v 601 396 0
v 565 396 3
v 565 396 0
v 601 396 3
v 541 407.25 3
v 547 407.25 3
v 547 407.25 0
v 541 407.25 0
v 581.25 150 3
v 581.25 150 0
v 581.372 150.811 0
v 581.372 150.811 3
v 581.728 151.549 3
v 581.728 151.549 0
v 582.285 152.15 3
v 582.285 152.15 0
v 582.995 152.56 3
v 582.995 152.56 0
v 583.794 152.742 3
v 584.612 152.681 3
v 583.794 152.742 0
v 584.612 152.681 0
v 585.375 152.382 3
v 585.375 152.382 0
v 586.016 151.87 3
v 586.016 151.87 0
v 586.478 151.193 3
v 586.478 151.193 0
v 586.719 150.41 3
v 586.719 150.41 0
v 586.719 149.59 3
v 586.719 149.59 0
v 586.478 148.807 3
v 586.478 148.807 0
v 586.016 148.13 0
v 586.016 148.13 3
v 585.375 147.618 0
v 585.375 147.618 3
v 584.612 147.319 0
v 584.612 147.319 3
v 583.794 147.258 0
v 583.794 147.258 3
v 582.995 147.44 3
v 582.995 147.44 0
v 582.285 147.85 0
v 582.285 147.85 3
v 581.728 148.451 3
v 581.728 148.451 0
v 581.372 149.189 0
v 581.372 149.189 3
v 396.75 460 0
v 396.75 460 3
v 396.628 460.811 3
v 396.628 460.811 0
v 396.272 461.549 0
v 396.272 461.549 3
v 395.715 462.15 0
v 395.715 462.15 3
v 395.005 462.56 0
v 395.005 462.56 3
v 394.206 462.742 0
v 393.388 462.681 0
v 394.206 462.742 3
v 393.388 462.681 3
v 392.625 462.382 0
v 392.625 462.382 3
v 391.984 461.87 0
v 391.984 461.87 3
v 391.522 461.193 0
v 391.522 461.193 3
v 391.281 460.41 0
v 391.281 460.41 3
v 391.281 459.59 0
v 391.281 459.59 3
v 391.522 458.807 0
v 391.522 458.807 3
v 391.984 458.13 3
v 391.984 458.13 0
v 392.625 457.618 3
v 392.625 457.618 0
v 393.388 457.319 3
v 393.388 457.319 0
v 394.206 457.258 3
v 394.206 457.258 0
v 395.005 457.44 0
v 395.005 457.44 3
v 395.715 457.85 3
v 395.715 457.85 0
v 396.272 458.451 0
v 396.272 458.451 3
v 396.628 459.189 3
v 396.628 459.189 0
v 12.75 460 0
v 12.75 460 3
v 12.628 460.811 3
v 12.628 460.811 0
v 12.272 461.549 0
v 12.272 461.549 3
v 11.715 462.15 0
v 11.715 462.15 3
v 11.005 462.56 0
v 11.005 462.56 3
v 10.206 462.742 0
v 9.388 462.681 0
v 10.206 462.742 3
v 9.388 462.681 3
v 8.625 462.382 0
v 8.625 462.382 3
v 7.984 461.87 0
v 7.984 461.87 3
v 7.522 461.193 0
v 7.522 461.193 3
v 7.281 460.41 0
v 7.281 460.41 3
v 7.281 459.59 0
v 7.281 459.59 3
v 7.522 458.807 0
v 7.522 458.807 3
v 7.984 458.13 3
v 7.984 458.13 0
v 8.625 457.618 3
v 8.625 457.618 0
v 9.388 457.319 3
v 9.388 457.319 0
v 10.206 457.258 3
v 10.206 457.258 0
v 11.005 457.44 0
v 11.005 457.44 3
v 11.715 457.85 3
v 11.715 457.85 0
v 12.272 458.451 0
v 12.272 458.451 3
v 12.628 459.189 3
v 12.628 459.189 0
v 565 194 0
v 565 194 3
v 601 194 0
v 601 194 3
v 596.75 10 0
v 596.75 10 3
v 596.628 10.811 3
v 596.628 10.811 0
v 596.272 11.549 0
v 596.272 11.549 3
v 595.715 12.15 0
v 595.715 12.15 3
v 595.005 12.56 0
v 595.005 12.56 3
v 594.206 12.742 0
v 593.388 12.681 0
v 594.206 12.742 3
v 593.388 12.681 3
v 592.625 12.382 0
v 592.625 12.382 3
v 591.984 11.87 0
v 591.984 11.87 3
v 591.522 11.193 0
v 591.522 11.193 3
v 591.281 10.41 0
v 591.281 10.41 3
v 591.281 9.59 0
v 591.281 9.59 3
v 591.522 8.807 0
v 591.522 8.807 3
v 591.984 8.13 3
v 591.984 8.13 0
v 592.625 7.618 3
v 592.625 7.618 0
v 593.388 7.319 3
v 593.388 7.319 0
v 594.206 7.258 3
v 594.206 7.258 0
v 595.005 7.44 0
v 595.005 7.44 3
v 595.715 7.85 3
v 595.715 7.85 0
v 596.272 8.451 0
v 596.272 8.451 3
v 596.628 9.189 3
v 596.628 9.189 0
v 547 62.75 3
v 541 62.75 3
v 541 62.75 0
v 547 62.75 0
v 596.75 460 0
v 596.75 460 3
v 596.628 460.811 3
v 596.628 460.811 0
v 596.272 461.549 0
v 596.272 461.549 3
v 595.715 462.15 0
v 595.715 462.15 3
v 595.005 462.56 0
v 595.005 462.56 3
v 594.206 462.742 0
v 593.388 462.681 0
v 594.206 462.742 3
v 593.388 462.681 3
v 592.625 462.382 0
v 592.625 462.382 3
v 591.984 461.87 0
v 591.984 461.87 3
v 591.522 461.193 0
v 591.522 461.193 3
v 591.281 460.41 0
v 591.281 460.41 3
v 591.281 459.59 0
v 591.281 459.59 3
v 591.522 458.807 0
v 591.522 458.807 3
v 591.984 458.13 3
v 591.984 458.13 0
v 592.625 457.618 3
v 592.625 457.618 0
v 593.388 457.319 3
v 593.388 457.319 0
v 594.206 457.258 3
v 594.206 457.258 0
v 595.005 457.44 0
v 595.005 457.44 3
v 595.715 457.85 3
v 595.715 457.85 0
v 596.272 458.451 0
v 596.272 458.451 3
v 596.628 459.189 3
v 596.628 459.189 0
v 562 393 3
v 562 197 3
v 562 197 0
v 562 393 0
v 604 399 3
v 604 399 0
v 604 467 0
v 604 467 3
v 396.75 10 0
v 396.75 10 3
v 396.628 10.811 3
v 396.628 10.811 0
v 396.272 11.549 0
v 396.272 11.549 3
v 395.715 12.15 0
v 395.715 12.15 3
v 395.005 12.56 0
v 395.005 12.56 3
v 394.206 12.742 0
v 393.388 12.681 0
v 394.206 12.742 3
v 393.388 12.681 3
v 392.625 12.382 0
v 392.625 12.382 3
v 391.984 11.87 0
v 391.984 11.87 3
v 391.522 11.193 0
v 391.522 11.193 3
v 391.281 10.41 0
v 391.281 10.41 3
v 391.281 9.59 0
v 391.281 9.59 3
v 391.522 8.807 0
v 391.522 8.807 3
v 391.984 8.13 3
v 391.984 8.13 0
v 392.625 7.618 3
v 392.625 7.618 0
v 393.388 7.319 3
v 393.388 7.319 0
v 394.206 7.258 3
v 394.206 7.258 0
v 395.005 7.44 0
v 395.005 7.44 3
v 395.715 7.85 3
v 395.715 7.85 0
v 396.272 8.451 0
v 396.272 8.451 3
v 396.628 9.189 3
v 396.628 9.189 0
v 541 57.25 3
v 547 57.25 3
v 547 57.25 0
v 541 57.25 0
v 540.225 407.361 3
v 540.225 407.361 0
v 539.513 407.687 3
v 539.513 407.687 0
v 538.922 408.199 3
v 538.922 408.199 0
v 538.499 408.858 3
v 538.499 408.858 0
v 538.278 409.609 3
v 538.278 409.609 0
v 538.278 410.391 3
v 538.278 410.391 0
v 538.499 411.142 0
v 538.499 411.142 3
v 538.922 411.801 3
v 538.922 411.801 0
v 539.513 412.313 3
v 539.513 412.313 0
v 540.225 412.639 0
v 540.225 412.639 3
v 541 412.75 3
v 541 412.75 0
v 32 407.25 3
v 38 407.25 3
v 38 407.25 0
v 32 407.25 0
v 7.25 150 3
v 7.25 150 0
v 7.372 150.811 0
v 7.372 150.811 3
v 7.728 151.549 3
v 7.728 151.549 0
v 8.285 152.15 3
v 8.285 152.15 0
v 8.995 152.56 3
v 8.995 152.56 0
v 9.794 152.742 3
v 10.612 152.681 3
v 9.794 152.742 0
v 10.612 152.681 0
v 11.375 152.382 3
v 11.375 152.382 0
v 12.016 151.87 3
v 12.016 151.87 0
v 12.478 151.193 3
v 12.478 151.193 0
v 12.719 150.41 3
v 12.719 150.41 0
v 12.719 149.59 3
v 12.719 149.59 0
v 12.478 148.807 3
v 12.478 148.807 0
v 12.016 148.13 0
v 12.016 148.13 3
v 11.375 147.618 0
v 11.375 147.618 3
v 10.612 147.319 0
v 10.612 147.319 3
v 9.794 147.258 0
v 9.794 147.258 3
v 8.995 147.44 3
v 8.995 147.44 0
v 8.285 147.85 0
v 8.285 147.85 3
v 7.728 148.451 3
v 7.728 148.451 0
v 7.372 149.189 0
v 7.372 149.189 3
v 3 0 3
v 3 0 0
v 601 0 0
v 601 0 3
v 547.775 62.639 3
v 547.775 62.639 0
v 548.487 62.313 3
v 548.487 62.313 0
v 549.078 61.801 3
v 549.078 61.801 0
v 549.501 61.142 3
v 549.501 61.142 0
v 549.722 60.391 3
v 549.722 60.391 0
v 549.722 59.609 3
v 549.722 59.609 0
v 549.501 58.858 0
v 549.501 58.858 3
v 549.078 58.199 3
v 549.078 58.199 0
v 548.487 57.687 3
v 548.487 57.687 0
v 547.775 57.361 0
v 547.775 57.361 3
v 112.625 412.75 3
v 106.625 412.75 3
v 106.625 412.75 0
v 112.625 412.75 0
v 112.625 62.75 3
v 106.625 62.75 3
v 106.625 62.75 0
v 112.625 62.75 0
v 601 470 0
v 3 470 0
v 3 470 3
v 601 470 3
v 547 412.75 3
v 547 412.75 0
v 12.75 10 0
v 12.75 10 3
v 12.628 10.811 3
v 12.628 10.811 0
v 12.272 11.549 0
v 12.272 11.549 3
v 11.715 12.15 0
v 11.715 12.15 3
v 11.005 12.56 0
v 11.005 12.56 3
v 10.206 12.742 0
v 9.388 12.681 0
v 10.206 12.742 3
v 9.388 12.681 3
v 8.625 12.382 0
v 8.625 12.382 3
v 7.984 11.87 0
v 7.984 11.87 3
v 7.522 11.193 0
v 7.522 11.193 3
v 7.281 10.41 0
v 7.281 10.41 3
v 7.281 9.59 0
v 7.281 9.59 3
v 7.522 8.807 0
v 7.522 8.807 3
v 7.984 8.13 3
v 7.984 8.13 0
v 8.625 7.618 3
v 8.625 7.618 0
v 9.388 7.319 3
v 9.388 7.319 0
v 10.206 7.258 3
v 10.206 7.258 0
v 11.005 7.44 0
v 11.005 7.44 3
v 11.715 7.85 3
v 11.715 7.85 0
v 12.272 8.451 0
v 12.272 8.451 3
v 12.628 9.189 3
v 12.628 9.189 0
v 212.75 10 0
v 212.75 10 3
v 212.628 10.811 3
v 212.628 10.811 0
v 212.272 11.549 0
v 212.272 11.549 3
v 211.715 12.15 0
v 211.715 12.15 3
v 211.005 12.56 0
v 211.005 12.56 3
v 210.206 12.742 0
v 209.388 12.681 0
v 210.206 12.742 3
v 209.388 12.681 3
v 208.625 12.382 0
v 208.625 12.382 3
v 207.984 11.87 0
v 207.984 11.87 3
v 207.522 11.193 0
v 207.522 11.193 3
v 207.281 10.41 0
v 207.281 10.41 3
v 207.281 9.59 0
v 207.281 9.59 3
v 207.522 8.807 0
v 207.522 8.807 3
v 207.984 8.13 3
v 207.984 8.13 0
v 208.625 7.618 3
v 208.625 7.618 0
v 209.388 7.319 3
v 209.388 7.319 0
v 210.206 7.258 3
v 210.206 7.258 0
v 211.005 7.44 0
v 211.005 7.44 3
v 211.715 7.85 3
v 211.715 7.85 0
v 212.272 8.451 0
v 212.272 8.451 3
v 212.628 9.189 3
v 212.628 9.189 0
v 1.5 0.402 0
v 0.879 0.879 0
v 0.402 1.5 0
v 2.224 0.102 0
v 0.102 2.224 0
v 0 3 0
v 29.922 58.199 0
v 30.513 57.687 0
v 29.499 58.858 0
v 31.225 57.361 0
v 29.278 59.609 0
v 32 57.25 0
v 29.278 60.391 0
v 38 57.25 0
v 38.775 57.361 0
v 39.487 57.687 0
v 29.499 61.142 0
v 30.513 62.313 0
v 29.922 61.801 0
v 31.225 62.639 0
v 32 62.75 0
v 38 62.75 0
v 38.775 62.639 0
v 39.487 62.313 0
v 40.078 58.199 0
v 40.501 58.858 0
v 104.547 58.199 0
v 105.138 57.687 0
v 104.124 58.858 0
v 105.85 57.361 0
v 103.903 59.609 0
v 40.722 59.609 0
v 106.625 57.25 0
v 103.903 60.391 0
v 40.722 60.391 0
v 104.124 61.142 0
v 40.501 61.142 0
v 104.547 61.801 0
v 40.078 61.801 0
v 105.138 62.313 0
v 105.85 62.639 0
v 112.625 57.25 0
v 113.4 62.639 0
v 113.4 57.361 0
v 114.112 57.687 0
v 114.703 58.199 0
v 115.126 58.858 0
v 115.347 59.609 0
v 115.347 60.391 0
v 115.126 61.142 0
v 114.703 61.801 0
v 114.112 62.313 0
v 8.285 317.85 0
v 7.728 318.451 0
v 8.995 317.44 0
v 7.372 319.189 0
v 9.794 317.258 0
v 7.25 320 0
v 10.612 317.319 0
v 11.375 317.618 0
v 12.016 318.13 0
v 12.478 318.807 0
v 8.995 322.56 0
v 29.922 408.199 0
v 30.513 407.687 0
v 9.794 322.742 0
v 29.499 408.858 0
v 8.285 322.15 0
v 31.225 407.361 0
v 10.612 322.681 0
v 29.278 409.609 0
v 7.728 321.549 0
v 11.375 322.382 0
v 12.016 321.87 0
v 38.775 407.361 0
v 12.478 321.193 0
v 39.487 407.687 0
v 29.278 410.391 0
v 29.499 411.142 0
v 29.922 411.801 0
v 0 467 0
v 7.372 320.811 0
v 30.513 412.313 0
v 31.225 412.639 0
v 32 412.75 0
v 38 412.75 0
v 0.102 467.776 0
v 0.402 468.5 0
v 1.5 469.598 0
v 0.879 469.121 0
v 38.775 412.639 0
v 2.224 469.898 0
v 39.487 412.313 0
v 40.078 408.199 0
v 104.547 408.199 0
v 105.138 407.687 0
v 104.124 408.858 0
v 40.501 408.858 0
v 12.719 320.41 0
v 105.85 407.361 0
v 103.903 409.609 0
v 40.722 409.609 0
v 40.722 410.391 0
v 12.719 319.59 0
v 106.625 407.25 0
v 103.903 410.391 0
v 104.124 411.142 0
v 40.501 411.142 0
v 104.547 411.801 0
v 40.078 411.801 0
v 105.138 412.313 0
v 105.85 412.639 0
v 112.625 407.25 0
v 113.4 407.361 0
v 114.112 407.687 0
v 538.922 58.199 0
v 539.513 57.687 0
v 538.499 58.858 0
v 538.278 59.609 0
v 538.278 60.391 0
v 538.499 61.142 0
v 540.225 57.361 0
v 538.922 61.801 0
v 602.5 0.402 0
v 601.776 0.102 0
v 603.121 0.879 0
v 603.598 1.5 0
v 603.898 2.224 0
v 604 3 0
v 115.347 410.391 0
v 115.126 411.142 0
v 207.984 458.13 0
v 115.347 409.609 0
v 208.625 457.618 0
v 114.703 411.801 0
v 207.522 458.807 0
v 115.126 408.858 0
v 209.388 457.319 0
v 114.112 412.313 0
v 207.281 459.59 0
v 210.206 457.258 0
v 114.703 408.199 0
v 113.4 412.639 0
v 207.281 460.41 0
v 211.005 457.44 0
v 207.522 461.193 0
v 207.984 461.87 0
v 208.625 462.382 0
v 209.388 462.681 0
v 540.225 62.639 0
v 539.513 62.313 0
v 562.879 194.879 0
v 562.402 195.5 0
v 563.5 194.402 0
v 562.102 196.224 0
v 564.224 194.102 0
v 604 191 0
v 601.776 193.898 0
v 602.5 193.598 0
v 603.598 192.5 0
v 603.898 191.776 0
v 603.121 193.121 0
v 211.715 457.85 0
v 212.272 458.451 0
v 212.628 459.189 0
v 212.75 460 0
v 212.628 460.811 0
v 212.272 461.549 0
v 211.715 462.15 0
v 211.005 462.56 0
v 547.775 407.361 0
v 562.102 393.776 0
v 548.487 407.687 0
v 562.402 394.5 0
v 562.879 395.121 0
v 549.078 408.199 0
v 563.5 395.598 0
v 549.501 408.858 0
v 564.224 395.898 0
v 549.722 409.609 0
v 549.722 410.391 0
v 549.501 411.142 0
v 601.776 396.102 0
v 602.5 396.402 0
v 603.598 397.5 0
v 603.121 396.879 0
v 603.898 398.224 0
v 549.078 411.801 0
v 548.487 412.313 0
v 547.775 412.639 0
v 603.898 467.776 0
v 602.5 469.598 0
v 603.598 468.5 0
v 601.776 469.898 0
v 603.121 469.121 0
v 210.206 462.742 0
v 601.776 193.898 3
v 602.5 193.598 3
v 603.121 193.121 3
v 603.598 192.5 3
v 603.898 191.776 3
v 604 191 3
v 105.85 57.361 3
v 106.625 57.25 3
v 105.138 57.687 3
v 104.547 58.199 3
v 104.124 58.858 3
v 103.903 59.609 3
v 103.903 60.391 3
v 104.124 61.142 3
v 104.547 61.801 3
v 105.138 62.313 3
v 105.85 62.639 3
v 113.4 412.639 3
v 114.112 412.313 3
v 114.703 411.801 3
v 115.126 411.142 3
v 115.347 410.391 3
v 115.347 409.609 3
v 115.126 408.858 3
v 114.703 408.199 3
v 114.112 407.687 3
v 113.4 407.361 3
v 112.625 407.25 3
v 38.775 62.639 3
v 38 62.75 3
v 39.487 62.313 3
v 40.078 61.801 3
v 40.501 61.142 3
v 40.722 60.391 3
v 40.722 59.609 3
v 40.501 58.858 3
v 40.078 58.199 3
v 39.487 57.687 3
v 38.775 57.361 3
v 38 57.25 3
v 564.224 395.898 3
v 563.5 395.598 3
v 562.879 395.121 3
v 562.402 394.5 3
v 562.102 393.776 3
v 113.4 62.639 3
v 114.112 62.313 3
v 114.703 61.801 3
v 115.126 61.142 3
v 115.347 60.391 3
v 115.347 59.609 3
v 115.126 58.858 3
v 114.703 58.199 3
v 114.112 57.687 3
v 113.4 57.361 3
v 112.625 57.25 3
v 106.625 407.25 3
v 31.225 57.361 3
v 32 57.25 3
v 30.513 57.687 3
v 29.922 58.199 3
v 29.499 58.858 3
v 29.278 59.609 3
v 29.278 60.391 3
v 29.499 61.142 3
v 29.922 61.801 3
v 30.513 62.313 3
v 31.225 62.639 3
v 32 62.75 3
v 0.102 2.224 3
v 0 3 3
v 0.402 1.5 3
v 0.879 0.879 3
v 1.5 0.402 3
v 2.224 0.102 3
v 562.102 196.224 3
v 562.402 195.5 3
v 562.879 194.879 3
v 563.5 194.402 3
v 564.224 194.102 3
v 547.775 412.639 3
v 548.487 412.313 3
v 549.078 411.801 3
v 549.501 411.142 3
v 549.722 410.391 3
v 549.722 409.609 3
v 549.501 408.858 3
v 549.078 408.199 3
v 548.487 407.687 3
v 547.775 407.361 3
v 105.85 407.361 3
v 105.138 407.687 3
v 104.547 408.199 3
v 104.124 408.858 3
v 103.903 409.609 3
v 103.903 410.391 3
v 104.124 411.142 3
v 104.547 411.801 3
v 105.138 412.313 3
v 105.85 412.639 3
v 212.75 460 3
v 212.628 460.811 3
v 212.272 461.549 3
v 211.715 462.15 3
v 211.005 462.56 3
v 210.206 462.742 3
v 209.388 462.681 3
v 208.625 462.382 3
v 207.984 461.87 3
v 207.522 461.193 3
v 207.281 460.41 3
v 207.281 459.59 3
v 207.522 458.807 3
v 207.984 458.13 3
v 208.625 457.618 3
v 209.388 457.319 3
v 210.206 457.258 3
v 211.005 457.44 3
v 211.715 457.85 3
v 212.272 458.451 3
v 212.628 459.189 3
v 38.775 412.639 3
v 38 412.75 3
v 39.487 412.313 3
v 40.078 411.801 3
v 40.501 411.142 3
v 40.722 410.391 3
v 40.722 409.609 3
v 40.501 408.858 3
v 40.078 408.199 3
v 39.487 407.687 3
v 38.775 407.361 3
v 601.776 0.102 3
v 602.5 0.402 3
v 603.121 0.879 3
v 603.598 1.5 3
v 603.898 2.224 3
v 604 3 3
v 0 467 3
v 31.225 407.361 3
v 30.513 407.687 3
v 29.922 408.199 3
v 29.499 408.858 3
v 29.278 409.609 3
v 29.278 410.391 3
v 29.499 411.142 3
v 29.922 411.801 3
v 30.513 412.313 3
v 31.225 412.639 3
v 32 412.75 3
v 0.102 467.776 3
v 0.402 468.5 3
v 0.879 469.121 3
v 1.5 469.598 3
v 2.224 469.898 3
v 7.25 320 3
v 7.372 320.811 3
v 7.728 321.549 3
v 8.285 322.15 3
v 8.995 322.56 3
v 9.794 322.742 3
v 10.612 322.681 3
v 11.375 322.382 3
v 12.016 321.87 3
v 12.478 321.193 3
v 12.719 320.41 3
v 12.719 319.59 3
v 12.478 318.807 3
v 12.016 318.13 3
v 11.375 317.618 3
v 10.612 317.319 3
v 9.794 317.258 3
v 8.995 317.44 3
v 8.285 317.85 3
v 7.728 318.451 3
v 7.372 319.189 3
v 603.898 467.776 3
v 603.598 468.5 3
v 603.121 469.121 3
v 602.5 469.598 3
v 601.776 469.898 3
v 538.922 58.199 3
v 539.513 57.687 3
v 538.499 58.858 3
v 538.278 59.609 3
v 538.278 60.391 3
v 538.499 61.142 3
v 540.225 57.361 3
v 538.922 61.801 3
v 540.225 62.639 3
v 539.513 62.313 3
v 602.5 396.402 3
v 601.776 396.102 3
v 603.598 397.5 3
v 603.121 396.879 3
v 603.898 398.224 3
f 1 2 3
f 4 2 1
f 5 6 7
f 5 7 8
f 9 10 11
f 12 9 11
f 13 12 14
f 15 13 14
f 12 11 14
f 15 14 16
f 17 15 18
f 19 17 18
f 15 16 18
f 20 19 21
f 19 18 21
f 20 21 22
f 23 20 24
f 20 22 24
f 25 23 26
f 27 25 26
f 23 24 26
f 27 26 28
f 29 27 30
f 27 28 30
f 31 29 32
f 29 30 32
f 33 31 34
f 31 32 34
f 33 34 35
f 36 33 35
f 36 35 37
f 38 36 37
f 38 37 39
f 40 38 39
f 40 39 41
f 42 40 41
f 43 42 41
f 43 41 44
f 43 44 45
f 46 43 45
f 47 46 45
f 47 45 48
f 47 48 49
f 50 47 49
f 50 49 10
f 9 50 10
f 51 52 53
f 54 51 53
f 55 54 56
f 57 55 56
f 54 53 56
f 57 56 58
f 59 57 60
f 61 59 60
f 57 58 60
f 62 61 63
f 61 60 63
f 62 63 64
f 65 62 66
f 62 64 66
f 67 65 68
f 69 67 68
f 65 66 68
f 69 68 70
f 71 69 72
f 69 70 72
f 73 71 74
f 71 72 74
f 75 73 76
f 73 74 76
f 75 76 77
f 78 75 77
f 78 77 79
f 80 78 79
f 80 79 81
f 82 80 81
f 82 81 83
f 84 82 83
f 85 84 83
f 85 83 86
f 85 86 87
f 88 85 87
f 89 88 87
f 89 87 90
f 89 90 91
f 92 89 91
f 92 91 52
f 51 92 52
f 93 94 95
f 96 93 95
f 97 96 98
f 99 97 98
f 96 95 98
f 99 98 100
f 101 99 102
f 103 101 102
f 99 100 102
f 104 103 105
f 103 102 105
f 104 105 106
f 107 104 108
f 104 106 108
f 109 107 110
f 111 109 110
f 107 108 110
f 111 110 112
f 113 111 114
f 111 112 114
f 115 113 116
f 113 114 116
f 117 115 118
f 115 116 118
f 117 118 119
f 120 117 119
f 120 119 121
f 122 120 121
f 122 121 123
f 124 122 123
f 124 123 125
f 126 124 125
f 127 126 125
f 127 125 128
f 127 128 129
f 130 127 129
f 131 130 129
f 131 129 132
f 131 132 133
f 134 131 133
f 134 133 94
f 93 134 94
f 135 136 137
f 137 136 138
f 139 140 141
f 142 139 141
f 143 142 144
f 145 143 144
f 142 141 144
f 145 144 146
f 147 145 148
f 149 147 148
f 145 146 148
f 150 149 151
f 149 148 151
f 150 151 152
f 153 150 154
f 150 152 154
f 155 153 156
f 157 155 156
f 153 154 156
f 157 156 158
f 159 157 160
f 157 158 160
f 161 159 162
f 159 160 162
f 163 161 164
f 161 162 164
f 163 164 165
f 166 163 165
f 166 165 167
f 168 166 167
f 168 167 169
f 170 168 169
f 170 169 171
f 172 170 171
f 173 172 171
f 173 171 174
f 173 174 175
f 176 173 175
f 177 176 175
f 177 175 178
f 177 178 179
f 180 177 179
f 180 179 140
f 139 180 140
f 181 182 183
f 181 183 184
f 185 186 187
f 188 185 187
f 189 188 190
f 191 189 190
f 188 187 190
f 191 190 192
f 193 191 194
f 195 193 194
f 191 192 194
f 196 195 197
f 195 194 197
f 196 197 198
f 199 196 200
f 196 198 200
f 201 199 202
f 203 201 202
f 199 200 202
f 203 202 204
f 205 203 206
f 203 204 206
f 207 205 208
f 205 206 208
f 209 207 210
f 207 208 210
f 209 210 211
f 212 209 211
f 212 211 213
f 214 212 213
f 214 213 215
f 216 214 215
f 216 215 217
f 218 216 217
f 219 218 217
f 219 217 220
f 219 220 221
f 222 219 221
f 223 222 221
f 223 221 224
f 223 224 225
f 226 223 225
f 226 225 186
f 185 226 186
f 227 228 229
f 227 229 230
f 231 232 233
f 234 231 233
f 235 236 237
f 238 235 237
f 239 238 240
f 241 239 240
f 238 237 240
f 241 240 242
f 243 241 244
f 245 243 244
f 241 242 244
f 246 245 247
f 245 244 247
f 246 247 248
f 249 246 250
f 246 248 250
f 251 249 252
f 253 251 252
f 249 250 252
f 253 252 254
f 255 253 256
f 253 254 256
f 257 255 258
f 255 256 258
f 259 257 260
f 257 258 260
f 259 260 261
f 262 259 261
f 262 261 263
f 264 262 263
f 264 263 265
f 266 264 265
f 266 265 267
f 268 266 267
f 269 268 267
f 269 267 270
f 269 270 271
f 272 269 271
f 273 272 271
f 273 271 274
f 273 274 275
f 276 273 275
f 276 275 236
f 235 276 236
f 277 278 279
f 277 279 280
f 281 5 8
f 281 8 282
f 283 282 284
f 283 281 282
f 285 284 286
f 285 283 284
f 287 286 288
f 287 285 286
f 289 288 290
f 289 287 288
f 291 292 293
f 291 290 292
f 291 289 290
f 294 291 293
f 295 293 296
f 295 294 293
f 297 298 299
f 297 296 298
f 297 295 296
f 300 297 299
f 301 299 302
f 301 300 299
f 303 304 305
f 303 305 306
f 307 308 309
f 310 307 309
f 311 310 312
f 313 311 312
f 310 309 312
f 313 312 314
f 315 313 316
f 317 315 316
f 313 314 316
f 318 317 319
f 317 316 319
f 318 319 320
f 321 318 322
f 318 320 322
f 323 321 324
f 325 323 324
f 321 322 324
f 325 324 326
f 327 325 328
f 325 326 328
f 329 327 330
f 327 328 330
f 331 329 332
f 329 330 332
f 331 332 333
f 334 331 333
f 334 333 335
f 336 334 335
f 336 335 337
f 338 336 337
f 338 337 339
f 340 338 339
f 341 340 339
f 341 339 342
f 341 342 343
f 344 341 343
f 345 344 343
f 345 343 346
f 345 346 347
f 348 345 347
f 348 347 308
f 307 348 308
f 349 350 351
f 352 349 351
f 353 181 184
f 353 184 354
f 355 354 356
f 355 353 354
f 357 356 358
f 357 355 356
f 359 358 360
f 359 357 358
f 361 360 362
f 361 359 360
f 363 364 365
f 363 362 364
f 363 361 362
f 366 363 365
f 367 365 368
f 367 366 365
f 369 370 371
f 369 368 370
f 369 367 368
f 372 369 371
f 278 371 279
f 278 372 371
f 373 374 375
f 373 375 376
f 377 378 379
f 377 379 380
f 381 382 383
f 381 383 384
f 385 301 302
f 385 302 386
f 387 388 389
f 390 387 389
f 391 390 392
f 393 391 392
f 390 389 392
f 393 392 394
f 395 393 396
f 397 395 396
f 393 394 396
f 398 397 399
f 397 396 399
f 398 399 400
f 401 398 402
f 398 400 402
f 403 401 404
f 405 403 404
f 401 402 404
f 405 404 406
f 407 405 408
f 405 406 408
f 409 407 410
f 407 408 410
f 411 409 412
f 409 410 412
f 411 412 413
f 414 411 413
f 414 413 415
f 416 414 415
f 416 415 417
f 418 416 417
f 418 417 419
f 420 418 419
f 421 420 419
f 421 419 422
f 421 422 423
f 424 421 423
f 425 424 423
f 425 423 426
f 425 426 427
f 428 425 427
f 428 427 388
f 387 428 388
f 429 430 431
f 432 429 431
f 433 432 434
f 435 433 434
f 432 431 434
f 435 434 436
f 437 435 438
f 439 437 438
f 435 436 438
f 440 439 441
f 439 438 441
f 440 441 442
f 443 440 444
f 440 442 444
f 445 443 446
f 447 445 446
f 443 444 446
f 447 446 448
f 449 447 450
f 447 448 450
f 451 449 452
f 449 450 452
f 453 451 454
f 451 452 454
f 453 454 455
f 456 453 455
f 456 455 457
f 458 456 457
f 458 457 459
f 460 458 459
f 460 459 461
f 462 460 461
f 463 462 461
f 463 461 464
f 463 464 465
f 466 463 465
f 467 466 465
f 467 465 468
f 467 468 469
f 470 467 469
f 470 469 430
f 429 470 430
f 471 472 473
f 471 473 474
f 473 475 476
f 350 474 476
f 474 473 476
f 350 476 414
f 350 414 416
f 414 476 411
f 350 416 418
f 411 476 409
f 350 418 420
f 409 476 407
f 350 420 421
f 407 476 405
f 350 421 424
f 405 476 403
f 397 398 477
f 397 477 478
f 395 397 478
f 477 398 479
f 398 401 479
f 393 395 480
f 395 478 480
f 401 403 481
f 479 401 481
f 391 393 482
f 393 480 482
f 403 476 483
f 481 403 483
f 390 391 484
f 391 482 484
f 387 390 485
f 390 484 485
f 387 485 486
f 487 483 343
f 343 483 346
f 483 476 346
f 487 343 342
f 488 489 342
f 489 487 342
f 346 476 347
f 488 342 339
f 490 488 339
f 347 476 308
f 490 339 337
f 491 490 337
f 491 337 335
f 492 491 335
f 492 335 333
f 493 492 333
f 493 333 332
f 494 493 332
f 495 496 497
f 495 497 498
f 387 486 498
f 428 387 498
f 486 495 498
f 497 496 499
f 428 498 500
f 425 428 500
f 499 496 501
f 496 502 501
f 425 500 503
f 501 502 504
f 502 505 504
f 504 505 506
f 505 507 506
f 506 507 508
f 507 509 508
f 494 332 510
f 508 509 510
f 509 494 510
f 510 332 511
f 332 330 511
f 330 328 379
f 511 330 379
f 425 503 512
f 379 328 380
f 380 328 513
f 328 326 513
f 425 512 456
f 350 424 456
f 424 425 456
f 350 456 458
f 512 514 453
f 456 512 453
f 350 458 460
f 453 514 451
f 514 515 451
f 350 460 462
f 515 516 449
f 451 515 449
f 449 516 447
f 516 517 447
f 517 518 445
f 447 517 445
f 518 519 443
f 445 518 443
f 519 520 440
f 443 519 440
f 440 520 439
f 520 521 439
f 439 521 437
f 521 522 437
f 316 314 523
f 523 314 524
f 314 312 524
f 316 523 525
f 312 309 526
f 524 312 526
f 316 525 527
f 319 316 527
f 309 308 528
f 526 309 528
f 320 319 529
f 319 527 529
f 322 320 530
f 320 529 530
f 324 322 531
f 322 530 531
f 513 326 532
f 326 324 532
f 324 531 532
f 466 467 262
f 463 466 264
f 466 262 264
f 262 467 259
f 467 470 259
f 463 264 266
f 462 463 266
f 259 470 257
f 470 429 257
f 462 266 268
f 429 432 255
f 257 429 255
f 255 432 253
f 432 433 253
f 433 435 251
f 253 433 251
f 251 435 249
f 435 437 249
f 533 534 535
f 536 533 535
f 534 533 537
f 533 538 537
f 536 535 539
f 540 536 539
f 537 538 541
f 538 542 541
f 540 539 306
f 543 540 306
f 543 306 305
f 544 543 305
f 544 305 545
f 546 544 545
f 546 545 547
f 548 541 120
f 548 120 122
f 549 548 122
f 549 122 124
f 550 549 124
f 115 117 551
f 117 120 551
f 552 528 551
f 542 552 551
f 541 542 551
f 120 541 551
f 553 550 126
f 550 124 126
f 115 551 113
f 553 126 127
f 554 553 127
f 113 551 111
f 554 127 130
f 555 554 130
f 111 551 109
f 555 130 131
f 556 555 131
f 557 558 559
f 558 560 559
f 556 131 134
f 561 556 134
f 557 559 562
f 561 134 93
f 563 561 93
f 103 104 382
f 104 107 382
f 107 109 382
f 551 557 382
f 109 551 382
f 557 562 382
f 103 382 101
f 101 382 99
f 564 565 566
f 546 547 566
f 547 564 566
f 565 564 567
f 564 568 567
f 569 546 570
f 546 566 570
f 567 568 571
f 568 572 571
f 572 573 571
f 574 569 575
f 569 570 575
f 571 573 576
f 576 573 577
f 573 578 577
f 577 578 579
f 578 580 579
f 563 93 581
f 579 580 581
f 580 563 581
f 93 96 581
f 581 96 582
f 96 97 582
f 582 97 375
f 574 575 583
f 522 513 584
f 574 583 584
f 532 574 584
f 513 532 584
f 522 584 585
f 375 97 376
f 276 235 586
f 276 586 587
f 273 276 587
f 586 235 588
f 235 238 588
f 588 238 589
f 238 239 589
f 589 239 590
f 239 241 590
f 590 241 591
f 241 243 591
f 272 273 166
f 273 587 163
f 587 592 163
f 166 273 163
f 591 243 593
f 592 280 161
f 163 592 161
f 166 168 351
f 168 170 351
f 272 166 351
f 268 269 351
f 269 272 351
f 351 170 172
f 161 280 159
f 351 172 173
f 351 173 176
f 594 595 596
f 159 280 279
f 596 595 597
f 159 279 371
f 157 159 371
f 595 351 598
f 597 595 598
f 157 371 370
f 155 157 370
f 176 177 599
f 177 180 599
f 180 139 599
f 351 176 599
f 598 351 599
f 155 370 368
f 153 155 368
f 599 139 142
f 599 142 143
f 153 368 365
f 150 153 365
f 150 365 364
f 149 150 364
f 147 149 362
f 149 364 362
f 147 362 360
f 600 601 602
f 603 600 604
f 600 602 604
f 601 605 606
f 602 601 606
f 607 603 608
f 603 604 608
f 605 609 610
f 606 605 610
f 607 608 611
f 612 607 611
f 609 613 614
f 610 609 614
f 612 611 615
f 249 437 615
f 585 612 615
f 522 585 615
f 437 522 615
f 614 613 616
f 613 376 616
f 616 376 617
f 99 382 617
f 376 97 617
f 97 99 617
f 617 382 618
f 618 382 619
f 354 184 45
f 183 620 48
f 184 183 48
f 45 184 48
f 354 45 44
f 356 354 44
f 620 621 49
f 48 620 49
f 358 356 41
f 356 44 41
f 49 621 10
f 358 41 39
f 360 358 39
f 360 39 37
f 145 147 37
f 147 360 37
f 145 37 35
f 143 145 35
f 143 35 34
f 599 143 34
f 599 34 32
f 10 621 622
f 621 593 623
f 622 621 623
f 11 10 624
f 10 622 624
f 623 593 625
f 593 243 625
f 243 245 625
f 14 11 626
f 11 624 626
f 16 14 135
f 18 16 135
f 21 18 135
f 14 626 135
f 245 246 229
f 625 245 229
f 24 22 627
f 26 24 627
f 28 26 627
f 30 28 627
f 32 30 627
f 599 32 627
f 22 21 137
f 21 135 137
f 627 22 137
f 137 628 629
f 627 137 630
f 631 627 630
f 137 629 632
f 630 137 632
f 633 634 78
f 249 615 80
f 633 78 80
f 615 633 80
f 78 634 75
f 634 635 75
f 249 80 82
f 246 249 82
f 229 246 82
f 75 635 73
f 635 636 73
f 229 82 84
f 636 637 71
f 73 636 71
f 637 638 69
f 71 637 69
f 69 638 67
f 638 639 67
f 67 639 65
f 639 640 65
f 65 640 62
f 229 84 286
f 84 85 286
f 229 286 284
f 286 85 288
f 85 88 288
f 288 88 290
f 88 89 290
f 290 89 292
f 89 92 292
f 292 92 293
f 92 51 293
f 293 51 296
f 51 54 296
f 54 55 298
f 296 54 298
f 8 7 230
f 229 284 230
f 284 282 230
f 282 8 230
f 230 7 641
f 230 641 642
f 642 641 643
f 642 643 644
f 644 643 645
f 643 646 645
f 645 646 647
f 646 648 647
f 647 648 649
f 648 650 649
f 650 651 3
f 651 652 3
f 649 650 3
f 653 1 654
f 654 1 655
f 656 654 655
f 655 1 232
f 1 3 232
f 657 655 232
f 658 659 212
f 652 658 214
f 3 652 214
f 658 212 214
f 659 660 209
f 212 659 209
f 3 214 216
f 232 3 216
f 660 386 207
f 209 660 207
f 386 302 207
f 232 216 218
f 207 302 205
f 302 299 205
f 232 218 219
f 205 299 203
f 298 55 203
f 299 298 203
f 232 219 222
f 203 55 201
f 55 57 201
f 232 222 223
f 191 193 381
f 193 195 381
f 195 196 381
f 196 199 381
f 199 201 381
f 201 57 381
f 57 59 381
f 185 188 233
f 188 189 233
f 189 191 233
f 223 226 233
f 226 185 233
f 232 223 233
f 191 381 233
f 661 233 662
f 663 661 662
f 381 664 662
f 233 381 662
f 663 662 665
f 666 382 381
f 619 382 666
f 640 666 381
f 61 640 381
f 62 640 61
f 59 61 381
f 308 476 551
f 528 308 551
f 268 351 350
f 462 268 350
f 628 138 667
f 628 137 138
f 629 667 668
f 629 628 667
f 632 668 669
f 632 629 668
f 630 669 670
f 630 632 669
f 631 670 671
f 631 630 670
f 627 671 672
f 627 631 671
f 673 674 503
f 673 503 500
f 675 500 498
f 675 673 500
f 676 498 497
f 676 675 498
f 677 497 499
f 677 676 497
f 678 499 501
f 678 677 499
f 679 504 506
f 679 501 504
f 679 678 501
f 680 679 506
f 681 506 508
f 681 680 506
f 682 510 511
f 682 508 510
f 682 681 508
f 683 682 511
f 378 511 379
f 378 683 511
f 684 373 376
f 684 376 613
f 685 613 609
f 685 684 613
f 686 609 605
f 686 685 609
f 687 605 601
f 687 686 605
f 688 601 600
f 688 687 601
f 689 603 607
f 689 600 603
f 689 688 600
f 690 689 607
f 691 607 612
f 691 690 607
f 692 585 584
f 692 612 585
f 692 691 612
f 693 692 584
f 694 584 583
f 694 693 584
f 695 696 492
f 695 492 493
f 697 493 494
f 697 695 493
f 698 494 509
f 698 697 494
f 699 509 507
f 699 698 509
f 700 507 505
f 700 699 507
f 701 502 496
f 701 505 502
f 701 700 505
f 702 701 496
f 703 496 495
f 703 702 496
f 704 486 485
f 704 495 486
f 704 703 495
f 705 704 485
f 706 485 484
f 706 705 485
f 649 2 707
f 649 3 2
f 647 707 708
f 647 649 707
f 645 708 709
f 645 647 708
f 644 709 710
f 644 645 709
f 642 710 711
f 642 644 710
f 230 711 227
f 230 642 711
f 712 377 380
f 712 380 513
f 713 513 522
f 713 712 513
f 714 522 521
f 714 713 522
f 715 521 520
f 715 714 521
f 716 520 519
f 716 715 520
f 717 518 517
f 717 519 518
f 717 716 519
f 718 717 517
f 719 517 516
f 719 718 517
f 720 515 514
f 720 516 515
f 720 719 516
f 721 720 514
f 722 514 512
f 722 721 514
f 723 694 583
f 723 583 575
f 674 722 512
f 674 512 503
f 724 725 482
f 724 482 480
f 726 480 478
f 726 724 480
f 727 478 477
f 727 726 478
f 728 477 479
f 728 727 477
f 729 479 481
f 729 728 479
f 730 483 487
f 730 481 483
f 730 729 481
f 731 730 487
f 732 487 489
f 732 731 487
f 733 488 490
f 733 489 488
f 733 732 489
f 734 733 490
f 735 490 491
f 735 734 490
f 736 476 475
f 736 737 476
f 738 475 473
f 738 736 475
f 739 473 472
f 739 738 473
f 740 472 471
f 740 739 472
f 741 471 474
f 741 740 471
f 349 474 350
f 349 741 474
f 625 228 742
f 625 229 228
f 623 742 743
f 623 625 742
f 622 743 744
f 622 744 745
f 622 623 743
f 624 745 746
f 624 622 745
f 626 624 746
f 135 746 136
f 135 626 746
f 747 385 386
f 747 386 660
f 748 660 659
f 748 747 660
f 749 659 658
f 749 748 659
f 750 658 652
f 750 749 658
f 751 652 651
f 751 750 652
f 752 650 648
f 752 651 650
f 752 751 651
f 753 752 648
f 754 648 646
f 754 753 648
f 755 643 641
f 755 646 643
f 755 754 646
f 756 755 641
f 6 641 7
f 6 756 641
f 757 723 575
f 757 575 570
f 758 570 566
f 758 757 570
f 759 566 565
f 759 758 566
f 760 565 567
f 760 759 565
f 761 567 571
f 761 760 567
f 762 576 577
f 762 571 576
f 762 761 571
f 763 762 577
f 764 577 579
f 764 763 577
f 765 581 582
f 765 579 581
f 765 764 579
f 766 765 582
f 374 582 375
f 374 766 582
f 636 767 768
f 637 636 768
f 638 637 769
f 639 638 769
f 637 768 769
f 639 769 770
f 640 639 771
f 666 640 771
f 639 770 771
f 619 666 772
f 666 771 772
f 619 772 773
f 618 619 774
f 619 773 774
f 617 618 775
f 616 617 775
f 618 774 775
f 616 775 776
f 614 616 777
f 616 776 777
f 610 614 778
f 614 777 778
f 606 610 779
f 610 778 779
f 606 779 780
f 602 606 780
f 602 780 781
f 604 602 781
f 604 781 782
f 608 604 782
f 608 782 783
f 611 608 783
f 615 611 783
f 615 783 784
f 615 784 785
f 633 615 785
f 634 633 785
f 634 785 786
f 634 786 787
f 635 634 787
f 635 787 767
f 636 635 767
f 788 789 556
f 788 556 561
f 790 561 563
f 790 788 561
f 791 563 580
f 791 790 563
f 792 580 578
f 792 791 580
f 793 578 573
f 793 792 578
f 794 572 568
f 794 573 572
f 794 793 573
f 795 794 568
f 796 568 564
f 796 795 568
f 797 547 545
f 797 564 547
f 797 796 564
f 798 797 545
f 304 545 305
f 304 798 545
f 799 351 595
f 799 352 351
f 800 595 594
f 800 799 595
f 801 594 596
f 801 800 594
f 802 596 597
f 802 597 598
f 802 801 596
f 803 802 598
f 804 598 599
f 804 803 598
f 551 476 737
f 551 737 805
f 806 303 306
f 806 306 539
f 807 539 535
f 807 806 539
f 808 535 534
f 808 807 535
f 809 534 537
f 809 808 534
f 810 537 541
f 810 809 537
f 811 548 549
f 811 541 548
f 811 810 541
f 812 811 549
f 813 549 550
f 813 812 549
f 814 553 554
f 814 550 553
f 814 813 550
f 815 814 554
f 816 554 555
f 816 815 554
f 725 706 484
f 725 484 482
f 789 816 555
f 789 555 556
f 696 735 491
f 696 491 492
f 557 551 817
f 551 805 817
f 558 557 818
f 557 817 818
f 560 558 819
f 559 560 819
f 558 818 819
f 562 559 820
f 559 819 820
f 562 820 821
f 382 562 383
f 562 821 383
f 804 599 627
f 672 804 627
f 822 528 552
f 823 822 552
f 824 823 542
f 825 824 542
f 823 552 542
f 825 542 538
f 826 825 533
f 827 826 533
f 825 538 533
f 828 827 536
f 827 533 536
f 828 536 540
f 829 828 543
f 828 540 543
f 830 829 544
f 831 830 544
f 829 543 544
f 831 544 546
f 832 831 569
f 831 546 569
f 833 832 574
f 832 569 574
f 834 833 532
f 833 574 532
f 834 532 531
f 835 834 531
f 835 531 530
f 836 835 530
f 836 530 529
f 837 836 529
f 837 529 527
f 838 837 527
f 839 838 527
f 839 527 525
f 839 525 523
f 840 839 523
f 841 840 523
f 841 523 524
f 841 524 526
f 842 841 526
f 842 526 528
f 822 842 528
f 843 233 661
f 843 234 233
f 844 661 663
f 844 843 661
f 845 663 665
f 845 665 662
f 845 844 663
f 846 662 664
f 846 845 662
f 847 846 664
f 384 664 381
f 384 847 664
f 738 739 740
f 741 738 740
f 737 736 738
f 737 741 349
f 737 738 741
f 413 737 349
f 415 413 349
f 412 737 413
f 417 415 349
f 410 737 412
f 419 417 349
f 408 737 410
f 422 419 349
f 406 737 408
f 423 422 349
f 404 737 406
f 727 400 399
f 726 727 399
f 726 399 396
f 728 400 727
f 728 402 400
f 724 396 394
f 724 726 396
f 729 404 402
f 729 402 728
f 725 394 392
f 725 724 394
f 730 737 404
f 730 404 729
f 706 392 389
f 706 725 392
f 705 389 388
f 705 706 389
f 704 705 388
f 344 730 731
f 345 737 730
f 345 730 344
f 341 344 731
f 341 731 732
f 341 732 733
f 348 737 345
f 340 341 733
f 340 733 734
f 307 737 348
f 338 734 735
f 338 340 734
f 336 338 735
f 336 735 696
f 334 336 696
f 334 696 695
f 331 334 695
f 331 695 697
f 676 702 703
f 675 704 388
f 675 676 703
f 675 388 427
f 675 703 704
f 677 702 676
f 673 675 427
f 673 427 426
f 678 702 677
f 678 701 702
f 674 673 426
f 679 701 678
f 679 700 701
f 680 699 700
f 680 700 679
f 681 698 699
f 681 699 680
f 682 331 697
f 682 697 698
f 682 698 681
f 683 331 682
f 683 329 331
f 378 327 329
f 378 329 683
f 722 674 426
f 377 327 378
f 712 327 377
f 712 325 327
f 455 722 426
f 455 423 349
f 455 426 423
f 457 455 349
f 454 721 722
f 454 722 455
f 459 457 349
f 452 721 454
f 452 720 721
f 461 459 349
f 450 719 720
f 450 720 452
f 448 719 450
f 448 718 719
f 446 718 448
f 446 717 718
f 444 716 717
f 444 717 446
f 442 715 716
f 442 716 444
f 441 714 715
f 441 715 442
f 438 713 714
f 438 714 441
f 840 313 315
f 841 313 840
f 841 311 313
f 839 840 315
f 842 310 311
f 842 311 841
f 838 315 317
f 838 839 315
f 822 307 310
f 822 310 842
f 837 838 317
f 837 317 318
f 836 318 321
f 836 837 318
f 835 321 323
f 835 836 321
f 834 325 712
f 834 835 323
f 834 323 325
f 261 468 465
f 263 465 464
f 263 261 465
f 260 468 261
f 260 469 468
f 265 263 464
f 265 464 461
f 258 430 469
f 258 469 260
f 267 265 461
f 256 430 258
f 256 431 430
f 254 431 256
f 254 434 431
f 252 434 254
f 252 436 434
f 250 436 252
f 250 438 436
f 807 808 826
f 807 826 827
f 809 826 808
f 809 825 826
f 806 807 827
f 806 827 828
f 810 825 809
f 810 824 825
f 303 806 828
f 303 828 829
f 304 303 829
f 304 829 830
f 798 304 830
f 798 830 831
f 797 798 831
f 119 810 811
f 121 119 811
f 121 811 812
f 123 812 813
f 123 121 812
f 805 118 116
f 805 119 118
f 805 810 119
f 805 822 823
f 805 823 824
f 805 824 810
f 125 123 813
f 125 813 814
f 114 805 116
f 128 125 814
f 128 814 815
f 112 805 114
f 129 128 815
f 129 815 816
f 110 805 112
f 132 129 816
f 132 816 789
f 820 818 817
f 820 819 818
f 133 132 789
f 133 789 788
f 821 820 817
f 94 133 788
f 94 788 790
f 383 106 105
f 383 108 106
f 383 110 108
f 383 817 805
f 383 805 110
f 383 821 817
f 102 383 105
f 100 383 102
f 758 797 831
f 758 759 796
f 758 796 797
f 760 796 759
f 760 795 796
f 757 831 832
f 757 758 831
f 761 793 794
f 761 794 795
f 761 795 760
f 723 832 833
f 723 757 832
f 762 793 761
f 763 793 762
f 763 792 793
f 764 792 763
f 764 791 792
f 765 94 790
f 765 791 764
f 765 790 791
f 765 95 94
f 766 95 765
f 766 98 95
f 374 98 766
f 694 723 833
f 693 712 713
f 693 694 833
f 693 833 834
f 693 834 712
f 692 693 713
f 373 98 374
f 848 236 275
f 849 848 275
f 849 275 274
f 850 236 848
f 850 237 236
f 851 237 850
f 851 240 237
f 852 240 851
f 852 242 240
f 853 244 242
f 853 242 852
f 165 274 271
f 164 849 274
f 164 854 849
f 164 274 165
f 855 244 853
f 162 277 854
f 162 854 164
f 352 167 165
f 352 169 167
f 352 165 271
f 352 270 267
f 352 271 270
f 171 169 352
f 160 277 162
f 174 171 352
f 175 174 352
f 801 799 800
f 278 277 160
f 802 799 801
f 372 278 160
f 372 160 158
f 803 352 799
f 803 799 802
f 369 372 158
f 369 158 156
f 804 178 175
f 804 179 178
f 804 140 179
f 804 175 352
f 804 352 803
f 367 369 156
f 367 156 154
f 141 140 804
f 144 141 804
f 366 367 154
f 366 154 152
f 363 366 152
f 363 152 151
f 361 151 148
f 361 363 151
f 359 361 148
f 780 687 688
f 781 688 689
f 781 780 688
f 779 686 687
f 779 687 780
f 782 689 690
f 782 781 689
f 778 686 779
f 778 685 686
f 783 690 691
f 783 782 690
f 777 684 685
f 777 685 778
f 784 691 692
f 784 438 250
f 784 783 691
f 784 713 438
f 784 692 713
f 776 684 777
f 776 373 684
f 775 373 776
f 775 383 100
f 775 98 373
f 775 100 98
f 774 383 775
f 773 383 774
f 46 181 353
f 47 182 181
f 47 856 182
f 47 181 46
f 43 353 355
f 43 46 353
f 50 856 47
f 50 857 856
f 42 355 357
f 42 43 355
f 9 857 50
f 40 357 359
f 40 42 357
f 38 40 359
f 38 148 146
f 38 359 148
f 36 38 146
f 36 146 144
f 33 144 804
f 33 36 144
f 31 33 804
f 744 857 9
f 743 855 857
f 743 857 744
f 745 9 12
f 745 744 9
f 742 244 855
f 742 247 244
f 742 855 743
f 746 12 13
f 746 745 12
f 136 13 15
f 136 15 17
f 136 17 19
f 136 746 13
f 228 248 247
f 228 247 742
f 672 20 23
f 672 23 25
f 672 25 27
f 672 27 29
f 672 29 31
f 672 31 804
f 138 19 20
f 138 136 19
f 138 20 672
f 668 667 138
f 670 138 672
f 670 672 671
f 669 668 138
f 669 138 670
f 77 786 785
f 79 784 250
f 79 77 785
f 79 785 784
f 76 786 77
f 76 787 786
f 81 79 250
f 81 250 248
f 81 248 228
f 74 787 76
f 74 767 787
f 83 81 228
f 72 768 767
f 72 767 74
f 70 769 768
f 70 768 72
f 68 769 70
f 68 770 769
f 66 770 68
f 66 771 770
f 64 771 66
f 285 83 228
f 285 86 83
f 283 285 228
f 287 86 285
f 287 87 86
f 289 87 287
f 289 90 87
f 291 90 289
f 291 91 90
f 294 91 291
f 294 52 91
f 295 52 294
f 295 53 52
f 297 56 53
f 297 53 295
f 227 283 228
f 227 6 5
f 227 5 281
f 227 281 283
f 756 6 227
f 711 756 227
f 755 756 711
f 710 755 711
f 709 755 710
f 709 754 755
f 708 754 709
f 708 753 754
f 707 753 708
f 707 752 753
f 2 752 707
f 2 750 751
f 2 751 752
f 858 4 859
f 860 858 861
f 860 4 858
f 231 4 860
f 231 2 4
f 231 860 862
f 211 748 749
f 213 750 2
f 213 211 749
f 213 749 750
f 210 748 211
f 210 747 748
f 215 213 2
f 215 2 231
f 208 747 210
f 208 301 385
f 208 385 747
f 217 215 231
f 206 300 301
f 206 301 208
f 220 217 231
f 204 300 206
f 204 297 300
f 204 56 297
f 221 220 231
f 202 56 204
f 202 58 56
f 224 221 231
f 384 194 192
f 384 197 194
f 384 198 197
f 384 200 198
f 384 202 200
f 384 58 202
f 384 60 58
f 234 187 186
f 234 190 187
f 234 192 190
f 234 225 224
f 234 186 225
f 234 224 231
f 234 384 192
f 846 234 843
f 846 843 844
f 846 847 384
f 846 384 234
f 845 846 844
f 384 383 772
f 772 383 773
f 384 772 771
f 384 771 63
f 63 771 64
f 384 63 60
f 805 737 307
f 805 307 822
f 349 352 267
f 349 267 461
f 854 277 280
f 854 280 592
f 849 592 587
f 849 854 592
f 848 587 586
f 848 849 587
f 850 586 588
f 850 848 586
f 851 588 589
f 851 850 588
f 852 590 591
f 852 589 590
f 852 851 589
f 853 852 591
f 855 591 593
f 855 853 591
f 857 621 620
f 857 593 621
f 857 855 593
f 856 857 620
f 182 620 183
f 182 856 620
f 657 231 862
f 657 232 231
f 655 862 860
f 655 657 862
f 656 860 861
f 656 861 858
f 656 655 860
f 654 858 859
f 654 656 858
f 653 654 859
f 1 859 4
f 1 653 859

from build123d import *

# Parameters (mm, degrees)
SKETCH1_W                         = 604
SKETCH1_H                         = 470
BOSS_EXTRUDE1_DEPTH               = 3
FILLET1_R                         = 3
M5_CLEARANCE_HOLE1_D              = 5.5
M5_MANUFACTURING_FIXTURING_HOLE_D = 5.5
CUT_EXTRUDE5_DEPTH                = 766.326727614
SKETCH6_W                         = 42
SKETCH6_H                         = 202
CUT_EXTRUDE2_DEPTH                = 766.326727614
FILLET3_R                         = 3


with BuildPart() as part:
    # Sketch1 → Boss-Extrude1 (new body)
    with BuildSketch(Plane.XY):
        with Locations((302, 235)):
            Rectangle(SKETCH1_W, SKETCH1_H)
    extrude(amount=BOSS_EXTRUDE1_DEPTH)

    # Fillet1
    fillet1_edges = [part.edges().sort_by_distance(p)[0] for p in [
        (0, 470, 1.5),
        (604, 470, 1.5),
        (604, 0, 1.5),
        (0, 0, 1.5),
    ]]
    fillet(fillet1_edges, radius=FILLET1_R)

    # M5 Clearance Hole1 (through all)
    with Locations(Plane(origin=(0, 0, 0), x_dir=(-1, 0, 0), z_dir=(0, 0, -1))):
        with Locations((-594, 460), (-394, 460), (-210, 460), (-10, 460), (-10, 10), (-210, 10), (-394, 10), (-594, 10), (-544, 410), (-544, 60), (-35, 410), (-35, 60), (-109.625, 410), (-109.625, 60)):
            Hole(M5_CLEARANCE_HOLE1_D / 2)

    # M5 Manufacturing Fixturing Hole (through all)
    with Locations(Plane.XY.offset(3)):
        with Locations((10, 320), (10, 150), (584, 320), (584, 150)):
            Hole(M5_MANUFACTURING_FIXTURING_HOLE_D / 2)

    # Sketch9 → Cut-Extrude5 (cut, through all)
    with BuildSketch(Plane.XY.offset(3)):
        with BuildLine():
            Line((32, 412.75), (38, 412.75))
            ThreePointArc((38, 412.75), (40.75, 410), (38, 407.25))
            Line((38, 407.25), (32, 407.25))
            ThreePointArc((32, 407.25), (29.25, 410), (32, 412.75))
        make_face()
        with BuildLine():
            Line((106.625, 412.75), (112.625, 412.75))
            ThreePointArc((112.625, 412.75), (115.375, 410), (112.625, 407.25))
            Line((112.625, 407.25), (106.625, 407.25))
            ThreePointArc((106.625, 407.25), (103.875, 410), (106.625, 412.75))
        make_face()
        with BuildLine():
            Line((32, 62.75), (38, 62.75))
            ThreePointArc((38, 62.75), (40.75, 60), (38, 57.25))
            Line((38, 57.25), (32, 57.25))
            ThreePointArc((32, 57.25), (29.25, 60), (32, 62.75))
        make_face()
        with BuildLine():
            Line((106.625, 62.75), (112.625, 62.75))
            ThreePointArc((112.625, 62.75), (115.375, 60), (112.625, 57.25))
            Line((112.625, 57.25), (106.625, 57.25))
            ThreePointArc((106.625, 57.25), (103.875, 60), (106.625, 62.75))
        make_face()
        with BuildLine():
            Line((541, 412.75), (547, 412.75))
            ThreePointArc((547, 412.75), (549.75, 410), (547, 407.25))
            Line((547, 407.25), (541, 407.25))
            ThreePointArc((541, 407.25), (538.25, 410), (541, 412.75))
        make_face()
        with BuildLine():
            Line((541, 62.75), (547, 62.75))
            ThreePointArc((547, 62.75), (549.75, 60), (547, 57.25))
            Line((547, 57.25), (541, 57.25))
            ThreePointArc((541, 57.25), (538.25, 60), (541, 62.75))
        make_face()
    extrude(amount=-CUT_EXTRUDE5_DEPTH, mode=Mode.SUBTRACT)

    # Sketch6 → Cut-Extrude2 (cut, through all)
    with BuildSketch(Plane.XY.offset(3)):
        with Locations((583, 295)):
            Rectangle(SKETCH6_W, SKETCH6_H)
    extrude(amount=-CUT_EXTRUDE2_DEPTH, mode=Mode.SUBTRACT)

    # Fillet3
    fillet3_edges = [part.edges().sort_by_distance(p)[0] for p in [
        (604, 396, 1.5),
        (604, 194, 1.5),
        (562, 194, 1.5),
        (562, 396, 1.5),
    ]]
    fillet(fillet3_edges, radius=FILLET3_R)


solid = part.part
